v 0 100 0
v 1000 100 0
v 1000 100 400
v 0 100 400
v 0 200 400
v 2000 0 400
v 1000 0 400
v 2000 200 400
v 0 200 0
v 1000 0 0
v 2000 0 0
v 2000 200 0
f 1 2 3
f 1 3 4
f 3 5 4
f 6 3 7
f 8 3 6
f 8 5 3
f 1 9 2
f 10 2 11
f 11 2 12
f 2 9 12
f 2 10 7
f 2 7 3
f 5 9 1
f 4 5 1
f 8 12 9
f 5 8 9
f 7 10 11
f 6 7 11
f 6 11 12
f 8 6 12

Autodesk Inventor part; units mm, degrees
ref_plane "YZ Plane" through (0, 0, 0) normal (1, 0, 0) x (0, 1, 0)
ref_plane "XZ Plane" through (0, 0, 0) normal (0, 1, 0) x (-1, 0, 0)
ref_plane "XY Plane" through (0, 0, 0) normal (0, 0, 1) x (1, 0, 0)
sketch "Boceto2" plane through (0, 0, 0) normal (0, 0, 1) x (1, 0, 0)
  line L0 (0, 0) -> (2000, 0)
  line L1 (2000, 0) -> (2000, 200)
  line L2 (2000, 200) -> (0, 200)
  line L3 (0, 200) -> (0, 0)
  line L4 (0, 0) -> (1000, 0)
  line L5 (1000, 0) -> (1000, 100)
  line L6 (1000, 100) -> (0, 100)
  line L7 (0, 100) -> (0, 0)
  dimension "d0" = 2000
  dimension "d1" = 200
  dimension "d2" = 1000
  dimension "d3" = 100
extrude "Extrusión1" add sketch "Boceto2" along normal blind 400 contours L5 L6 L3 L2 L1 L0
properties part number "3D_Domain"
